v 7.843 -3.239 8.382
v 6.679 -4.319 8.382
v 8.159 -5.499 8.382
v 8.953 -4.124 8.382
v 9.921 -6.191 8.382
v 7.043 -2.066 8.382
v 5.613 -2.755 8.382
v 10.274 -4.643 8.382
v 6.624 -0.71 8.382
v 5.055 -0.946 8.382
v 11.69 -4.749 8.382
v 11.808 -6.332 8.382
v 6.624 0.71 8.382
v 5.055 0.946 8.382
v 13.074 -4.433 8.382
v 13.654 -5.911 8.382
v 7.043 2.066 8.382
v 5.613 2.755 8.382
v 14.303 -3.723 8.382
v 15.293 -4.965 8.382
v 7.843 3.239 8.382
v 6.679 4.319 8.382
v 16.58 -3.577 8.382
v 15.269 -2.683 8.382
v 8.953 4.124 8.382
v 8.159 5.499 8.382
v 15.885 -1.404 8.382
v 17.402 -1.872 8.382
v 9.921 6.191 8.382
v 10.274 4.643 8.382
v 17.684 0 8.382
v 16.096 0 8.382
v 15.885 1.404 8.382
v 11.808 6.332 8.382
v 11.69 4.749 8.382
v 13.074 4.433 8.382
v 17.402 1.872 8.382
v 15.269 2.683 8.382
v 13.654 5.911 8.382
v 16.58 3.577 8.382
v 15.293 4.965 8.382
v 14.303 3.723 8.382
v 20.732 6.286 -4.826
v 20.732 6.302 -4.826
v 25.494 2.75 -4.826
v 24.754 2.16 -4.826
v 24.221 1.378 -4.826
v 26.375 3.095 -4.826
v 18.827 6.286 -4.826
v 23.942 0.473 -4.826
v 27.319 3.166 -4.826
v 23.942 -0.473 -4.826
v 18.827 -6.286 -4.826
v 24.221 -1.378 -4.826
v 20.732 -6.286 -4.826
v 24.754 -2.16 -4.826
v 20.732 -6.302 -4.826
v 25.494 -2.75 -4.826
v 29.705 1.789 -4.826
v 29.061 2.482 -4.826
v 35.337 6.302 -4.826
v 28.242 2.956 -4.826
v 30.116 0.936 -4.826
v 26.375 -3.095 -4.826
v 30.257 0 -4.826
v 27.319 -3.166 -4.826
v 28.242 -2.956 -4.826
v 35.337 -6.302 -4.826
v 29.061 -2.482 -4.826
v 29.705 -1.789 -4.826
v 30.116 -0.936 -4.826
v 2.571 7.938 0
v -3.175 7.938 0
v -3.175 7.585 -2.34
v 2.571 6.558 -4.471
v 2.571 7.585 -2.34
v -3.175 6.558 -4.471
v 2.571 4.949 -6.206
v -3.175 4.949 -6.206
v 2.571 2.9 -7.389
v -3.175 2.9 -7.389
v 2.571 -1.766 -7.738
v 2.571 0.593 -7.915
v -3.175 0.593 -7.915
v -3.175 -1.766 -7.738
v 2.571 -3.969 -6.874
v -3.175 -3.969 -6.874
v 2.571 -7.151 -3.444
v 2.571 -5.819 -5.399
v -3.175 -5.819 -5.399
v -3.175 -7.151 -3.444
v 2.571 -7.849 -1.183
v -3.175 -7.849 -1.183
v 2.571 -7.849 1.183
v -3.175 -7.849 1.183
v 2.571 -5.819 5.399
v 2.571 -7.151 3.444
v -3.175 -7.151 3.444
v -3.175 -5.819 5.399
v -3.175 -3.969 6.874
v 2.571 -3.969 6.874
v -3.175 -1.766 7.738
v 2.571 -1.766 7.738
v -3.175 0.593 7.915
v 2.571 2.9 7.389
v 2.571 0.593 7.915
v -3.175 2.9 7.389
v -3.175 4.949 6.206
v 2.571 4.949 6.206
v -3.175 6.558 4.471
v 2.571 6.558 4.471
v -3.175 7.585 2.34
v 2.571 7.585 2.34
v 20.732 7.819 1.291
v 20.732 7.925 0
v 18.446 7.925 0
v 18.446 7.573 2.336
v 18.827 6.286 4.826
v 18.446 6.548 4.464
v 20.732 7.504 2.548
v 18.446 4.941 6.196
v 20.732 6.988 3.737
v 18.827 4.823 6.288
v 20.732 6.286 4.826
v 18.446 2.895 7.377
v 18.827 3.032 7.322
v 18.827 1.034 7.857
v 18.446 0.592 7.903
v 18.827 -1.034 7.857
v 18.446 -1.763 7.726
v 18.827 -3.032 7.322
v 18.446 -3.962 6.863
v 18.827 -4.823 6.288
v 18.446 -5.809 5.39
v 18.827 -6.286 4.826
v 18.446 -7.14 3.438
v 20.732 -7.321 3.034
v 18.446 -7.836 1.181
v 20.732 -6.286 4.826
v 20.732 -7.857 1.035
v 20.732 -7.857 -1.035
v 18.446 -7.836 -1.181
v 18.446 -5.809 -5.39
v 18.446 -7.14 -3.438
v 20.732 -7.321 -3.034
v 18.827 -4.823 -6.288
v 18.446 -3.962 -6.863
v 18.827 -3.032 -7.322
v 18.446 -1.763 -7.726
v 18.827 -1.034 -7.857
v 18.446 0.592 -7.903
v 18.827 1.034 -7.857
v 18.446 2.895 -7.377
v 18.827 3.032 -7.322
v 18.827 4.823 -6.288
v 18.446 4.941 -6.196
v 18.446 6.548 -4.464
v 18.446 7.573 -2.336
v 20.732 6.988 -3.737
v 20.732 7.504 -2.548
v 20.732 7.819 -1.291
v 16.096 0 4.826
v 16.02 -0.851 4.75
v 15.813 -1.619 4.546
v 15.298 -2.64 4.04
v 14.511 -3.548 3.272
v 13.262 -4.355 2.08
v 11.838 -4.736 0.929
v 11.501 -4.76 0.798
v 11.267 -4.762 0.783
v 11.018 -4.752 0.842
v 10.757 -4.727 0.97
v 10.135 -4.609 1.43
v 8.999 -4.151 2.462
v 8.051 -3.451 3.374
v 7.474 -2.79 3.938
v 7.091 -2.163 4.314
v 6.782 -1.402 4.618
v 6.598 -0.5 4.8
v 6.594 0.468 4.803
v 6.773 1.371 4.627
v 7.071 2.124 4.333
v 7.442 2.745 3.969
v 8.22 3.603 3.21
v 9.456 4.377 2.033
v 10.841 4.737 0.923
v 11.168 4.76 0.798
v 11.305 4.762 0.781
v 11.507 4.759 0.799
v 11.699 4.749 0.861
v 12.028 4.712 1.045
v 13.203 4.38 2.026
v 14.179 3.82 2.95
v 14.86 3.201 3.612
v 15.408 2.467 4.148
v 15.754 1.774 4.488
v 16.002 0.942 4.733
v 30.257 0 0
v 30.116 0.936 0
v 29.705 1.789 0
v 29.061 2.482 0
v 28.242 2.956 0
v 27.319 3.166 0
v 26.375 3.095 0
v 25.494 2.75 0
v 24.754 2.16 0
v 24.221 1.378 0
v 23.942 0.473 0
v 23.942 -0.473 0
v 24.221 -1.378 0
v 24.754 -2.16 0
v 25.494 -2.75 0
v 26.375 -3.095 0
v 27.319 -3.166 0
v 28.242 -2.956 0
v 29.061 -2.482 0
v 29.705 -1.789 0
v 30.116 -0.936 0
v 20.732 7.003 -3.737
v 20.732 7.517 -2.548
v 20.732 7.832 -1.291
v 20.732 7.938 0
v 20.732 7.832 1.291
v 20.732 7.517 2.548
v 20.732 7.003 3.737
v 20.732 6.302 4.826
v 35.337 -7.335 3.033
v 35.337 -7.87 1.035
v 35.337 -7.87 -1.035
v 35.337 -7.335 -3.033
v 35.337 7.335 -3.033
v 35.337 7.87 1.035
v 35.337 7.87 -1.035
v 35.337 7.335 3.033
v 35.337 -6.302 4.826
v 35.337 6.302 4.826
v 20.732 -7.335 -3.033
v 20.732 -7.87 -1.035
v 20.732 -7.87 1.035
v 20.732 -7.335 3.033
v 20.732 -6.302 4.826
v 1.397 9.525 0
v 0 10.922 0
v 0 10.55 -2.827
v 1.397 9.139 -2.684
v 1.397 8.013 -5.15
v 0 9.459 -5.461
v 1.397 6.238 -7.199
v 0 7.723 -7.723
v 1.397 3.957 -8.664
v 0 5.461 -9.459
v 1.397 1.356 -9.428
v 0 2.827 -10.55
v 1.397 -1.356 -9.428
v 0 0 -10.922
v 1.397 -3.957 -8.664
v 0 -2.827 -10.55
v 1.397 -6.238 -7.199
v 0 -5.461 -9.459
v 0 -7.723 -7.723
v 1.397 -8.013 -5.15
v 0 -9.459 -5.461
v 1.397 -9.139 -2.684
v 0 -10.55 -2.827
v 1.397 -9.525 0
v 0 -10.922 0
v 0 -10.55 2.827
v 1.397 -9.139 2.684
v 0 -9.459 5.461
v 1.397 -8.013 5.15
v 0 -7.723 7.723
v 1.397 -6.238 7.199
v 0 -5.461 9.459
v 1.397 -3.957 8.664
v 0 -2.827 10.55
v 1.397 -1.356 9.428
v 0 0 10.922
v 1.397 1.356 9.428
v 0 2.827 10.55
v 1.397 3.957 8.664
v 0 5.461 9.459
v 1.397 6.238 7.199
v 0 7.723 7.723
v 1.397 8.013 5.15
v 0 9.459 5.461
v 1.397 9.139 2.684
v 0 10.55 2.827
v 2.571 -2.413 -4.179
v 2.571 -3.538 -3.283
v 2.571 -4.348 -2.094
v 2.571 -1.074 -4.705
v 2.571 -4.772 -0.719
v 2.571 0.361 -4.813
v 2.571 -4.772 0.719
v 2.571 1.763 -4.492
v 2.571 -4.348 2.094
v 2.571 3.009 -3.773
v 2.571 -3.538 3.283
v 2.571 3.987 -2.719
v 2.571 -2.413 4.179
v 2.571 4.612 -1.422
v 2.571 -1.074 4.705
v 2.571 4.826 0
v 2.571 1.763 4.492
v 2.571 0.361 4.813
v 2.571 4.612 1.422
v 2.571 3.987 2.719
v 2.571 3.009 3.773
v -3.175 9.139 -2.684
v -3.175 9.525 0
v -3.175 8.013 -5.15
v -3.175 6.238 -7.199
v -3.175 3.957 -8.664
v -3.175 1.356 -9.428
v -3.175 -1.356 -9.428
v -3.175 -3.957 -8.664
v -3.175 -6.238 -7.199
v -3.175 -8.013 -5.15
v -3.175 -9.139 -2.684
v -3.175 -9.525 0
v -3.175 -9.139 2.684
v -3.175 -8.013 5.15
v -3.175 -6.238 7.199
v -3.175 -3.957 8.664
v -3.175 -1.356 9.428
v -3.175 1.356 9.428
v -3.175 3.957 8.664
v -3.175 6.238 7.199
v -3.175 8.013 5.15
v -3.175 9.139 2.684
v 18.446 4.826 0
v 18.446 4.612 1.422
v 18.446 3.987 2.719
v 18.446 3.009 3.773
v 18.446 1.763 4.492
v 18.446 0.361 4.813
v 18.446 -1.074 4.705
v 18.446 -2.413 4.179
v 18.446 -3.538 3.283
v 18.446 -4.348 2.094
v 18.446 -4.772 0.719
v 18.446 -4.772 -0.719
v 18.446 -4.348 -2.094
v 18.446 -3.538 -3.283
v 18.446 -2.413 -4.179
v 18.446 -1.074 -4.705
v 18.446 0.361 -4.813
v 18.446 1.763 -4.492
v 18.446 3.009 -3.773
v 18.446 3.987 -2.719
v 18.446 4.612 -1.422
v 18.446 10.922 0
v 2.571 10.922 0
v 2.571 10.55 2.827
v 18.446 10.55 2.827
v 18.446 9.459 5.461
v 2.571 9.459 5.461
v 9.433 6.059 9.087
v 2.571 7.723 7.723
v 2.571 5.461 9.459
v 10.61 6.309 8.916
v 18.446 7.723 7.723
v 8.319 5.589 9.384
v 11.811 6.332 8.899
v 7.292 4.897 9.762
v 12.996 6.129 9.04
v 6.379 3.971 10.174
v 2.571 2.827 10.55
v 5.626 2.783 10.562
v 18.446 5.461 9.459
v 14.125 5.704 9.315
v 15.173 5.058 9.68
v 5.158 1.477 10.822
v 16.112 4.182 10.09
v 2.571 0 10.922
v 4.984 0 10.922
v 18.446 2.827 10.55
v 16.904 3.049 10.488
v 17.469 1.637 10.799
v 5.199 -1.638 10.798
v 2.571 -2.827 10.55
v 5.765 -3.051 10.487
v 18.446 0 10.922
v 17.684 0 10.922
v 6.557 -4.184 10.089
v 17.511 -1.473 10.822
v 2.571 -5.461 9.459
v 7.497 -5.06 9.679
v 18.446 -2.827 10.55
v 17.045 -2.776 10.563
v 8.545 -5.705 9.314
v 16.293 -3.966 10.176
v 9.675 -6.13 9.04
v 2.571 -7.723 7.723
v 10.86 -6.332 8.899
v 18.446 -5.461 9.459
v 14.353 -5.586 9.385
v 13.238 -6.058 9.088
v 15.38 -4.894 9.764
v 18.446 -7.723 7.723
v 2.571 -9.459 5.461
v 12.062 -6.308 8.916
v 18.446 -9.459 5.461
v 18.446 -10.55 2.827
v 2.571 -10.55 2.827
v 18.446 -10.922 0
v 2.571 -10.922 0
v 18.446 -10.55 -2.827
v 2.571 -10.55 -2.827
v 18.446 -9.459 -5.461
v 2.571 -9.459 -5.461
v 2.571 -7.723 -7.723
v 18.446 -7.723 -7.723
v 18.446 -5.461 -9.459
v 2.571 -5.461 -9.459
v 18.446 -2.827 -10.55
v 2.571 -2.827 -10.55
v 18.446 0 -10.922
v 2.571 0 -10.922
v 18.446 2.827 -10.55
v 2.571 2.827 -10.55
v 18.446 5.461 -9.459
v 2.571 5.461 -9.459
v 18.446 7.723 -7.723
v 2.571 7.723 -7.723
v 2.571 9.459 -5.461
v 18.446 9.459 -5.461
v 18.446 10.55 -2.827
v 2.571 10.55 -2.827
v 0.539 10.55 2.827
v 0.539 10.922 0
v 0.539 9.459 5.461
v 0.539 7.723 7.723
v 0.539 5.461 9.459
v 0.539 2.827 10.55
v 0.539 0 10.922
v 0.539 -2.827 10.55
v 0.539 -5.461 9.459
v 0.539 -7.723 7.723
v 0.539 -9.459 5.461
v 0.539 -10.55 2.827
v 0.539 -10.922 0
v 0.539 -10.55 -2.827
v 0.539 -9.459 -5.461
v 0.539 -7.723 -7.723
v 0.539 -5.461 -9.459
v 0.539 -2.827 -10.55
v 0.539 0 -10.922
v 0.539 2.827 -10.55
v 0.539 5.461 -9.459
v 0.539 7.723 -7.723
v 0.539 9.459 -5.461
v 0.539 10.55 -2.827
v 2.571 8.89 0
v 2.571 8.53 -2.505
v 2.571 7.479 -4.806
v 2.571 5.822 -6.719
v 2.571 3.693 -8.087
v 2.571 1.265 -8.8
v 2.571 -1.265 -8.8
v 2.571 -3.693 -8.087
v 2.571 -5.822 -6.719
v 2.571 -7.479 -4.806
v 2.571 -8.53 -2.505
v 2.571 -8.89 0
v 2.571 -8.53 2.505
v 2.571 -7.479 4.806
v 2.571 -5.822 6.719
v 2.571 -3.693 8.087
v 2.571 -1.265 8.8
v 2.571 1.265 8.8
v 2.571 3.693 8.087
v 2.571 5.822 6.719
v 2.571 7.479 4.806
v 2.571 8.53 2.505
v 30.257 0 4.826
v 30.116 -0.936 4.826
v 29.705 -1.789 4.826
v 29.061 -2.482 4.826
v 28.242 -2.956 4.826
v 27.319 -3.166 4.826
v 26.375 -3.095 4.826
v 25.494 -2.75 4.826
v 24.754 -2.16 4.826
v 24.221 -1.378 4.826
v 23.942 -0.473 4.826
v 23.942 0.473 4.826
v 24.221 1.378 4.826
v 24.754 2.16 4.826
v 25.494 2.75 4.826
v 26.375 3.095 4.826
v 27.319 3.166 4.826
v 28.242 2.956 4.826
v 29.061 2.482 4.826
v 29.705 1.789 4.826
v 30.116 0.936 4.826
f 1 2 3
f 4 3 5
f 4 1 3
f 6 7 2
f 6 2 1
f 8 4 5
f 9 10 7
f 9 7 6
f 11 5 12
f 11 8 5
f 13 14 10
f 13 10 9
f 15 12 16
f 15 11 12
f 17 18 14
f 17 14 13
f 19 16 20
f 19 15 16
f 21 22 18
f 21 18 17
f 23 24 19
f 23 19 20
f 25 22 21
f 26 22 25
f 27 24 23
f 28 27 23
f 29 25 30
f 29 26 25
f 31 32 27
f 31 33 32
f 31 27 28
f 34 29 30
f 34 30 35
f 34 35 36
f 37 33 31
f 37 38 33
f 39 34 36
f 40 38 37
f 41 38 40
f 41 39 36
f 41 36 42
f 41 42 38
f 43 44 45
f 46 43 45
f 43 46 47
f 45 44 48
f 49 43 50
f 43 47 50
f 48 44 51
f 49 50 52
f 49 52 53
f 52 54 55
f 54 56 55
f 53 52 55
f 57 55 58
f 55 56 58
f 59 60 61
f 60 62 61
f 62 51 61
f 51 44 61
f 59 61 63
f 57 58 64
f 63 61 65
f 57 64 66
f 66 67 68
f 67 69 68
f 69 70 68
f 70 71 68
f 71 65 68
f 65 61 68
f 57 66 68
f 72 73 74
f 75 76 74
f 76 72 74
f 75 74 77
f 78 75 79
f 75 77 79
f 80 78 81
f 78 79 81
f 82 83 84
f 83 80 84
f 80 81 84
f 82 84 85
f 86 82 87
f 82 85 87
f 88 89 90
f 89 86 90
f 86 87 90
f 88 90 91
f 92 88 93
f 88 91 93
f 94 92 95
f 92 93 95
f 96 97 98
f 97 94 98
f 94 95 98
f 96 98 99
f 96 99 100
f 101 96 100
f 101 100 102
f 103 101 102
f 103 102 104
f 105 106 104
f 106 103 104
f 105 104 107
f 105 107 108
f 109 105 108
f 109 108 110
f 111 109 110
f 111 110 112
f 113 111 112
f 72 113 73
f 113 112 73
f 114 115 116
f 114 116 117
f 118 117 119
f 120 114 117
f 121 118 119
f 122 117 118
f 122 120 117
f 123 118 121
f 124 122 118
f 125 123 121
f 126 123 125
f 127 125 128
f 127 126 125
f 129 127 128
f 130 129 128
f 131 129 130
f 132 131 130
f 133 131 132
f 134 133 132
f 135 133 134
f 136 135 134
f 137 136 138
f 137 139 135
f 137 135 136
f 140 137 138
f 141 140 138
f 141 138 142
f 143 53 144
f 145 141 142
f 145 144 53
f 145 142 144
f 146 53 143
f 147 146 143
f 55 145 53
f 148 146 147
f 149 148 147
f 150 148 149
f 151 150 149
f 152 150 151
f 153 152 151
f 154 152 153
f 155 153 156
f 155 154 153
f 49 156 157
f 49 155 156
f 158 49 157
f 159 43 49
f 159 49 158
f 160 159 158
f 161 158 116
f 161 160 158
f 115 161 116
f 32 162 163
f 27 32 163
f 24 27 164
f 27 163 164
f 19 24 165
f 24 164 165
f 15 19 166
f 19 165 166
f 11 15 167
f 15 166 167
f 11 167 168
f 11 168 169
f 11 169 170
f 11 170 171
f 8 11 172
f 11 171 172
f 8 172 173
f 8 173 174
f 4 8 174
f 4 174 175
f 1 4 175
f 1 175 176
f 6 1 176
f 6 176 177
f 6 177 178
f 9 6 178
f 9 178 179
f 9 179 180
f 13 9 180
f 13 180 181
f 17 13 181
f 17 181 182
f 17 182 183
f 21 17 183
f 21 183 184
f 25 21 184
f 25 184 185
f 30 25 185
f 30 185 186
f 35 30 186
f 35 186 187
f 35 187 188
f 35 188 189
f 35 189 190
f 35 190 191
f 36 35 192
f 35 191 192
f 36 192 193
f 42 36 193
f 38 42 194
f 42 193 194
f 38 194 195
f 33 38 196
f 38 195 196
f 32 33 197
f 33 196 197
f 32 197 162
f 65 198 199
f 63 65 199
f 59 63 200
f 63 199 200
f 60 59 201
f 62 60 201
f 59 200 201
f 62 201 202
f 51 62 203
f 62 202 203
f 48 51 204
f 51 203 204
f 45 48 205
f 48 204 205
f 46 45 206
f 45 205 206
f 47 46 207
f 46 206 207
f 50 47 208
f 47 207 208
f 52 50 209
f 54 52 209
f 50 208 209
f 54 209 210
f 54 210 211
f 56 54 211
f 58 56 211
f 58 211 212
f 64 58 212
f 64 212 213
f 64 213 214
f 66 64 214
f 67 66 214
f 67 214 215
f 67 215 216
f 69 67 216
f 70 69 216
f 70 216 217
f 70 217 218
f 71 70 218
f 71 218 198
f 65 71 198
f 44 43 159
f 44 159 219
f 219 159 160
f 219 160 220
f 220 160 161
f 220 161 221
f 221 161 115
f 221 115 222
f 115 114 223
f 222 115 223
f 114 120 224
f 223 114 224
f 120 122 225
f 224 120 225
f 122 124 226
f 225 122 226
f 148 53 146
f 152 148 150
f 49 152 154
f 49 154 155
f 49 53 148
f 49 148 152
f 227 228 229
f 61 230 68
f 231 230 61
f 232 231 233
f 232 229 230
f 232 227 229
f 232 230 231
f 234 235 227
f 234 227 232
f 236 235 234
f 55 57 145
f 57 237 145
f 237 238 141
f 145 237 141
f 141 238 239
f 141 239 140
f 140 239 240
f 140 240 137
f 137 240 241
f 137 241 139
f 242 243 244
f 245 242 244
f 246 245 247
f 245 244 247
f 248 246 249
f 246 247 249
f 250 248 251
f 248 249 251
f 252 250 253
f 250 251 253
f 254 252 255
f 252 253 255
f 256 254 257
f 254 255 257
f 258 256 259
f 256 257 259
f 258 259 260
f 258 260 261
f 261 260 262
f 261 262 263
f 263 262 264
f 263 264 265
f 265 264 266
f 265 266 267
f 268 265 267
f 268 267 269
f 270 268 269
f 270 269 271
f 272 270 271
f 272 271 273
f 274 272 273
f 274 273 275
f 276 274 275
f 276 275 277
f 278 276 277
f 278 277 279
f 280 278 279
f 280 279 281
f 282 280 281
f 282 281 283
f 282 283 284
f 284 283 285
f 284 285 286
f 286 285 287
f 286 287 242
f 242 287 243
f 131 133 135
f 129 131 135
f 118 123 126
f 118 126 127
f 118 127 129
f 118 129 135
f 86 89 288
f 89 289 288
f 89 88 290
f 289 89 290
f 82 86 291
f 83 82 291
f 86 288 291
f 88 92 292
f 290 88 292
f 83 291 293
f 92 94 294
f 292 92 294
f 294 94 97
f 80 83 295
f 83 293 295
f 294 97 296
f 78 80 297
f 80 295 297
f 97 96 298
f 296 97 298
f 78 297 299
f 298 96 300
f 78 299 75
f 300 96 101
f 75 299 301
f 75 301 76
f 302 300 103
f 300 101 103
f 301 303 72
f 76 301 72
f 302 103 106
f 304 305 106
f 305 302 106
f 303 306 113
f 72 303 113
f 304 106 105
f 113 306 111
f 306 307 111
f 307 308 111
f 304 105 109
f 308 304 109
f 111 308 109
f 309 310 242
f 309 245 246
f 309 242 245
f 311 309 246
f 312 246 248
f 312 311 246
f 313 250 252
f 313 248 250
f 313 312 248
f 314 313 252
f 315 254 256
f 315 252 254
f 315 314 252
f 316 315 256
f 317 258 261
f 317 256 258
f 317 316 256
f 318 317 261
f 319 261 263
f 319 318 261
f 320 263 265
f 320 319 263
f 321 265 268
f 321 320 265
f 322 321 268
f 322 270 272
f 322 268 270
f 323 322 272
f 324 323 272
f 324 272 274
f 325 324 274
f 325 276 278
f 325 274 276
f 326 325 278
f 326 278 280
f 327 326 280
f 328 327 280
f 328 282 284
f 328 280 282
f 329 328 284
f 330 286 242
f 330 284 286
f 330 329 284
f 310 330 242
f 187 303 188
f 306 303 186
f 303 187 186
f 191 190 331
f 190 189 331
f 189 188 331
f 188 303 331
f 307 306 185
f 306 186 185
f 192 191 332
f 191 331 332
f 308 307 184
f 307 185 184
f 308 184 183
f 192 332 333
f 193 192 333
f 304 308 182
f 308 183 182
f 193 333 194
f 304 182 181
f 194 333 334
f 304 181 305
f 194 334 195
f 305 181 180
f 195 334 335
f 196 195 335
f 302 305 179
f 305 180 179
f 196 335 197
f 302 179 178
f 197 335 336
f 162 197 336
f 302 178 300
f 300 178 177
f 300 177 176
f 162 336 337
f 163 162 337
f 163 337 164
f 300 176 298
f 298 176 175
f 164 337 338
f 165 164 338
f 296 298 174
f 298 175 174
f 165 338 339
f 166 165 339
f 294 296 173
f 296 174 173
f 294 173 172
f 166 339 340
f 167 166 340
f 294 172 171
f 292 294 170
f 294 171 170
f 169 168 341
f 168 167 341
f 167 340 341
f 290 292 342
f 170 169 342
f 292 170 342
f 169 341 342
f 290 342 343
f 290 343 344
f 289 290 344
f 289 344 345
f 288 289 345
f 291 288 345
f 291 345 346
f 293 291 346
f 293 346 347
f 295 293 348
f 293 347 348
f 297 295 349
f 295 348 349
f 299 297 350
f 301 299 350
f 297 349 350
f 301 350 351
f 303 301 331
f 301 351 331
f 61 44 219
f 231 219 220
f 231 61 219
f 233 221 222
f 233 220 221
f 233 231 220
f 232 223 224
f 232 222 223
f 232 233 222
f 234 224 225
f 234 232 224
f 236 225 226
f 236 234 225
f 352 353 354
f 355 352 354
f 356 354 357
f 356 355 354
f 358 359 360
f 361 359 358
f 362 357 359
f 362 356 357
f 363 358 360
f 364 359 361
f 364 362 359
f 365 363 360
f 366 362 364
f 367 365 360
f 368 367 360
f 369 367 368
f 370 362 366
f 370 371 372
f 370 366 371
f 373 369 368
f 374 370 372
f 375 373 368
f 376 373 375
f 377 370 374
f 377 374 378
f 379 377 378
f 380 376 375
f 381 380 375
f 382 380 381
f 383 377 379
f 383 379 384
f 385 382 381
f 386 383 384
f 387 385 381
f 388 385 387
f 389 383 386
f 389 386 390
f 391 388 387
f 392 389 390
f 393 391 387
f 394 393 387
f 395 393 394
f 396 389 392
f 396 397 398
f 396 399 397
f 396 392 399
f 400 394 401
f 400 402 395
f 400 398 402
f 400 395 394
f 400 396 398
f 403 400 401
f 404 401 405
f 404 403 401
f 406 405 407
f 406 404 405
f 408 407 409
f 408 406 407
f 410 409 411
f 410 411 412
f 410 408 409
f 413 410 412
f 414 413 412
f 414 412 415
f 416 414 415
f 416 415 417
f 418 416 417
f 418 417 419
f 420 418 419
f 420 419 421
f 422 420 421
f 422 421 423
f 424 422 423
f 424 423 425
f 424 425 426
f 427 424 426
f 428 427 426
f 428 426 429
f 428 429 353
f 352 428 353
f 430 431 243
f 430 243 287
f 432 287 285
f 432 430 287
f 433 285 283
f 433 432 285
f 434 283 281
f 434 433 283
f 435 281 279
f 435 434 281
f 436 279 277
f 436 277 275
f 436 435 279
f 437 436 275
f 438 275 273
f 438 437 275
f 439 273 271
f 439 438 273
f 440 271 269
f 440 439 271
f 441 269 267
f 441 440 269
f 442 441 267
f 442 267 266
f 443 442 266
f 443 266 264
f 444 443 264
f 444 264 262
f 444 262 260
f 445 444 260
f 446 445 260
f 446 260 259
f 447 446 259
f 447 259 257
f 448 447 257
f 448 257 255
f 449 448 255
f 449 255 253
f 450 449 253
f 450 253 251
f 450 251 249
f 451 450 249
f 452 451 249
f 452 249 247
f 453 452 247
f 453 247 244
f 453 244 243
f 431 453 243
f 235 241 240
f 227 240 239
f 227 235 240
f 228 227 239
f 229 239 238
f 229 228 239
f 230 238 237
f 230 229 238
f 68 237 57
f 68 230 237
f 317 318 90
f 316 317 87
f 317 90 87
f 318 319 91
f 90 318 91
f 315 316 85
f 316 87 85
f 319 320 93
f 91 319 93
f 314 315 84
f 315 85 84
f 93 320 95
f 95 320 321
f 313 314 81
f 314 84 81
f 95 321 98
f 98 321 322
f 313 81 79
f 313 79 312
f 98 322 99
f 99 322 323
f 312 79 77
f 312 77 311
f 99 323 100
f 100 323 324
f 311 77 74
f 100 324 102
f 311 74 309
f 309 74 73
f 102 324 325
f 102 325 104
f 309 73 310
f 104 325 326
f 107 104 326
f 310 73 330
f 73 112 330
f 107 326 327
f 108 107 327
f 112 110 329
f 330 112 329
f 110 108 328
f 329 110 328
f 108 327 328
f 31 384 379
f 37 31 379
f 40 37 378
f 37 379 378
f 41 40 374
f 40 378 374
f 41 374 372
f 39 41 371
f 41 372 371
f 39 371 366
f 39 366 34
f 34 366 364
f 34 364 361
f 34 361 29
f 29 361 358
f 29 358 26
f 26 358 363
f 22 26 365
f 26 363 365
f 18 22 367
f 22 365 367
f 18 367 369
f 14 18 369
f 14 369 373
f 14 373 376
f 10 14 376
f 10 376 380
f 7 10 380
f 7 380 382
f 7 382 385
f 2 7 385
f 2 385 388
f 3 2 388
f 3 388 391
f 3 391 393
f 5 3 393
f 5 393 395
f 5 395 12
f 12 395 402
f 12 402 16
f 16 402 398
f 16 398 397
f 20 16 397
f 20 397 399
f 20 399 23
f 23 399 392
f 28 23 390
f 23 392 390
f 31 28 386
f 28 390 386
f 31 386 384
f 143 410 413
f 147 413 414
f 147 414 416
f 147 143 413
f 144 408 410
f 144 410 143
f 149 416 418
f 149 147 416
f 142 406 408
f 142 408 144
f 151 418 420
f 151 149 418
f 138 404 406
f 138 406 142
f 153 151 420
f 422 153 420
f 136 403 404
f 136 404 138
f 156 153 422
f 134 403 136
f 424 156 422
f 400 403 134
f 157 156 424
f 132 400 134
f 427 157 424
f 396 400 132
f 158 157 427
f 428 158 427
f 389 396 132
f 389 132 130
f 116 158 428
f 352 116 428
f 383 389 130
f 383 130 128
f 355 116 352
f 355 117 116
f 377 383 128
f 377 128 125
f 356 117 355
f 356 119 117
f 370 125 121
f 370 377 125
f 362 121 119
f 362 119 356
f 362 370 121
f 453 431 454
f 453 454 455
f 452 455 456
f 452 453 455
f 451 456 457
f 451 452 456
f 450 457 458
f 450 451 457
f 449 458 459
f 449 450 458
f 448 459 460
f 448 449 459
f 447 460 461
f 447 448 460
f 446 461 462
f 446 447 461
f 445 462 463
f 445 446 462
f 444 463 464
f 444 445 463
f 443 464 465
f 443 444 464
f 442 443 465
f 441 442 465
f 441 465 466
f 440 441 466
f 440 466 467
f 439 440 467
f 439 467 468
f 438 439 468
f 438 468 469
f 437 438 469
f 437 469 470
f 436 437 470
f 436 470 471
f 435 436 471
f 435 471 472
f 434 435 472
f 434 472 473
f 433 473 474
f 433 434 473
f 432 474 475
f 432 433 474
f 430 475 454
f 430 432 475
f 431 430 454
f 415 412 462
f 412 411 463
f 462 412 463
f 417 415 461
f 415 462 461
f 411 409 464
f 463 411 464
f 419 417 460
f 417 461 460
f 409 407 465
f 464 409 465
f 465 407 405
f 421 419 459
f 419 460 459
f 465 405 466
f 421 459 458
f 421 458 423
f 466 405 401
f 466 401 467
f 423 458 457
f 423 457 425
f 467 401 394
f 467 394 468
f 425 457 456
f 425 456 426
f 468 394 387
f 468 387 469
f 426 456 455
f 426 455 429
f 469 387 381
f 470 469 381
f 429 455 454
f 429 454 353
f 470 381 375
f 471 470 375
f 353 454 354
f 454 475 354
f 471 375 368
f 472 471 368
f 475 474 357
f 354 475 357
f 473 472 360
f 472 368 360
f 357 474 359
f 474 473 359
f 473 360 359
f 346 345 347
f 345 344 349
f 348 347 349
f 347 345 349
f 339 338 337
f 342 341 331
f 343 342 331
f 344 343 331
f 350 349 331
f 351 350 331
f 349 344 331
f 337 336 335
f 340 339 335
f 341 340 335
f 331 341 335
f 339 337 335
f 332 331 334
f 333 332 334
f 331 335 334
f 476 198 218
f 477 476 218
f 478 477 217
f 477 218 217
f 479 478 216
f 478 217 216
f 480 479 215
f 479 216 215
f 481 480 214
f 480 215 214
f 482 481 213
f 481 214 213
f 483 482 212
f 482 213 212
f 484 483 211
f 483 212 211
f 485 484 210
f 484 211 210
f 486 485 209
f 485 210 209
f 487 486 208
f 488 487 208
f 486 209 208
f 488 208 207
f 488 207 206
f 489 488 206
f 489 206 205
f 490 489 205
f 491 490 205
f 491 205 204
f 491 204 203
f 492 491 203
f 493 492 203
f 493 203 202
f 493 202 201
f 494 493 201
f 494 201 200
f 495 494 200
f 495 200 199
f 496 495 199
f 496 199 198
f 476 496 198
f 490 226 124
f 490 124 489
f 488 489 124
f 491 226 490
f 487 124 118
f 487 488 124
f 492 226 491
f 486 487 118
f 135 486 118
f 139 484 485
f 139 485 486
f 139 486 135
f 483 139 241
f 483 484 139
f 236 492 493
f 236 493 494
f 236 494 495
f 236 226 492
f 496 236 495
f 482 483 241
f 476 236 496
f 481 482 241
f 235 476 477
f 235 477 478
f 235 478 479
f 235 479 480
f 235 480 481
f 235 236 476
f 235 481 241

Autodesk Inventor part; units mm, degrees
ref_plane "YZ Plane" through (0, 0, 0) normal (1, 0, 0) x (0, 1, 0)
ref_plane "XZ Plane" through (0, 0, 0) normal (0, 1, 0) x (-1, 0, 0)
sketch "Sketch1" plane through (0, 0, 0) normal (0, 0, 1) x (1, 0, 0)
  line L0 (0, 0) -> (35.3368, 0)
  line L1 (0, 10.922) -> (1.397, 9.525)
  line L2 (0, 10.922) -> (0.5388, 10.922)
  line L3 (0.5388, 10.922) -> (2.5708, 8.89)
  line L4 (2.5708, 8.89) -> (2.5708, 10.922)
  line L5 (2.5708, 10.922) -> (18.4458, 10.922)
  line L6 (18.4458, 10.922) -> (18.4458, 7.9248)
  line L7 (18.4458, 7.9248) -> (20.7318, 7.9248)
  line L8 (20.7318, 7.9248) -> (20.7318, 7.9375)
  line L9 (20.7318, 7.9375) -> (35.3368, 7.9375)
  line L10 (35.3368, 7.9375) -> (35.3368, 0)
  circle A0 centre (11.3338, 0) radius 4.7625
  circle A1 centre (27.0818, 0) radius 3.175
  line L11 (0, 10.922) -> (0, 0) construction
  line L12 (0.5388, 10.922) -> (2.5708, 10.922) construction
  line L13 (2.5708, 8.89) -> (2.5708, 7.9375) construction
  line L14 (1.397, 9.525) -> (0, 9.525)
  line L15 (0, 9.525) -> (0, 7.9375) construction
  line L16 (2.5708, 7.9375) -> (0, 7.9375)
  line L17 (0, 9.525) -> (0, 7.9375)
  line L18 (2.5708, 7.9375) -> (2.5708, 4.826)
  line L19 (2.5708, 4.826) -> (18.4458, 4.826)
  line L20 (18.4458, 4.826) -> (18.4458, 0)
  line L21 (18.4458, 7.9248) -> (18.4458, 4.826)
  line L22 (35.3368, 4.826) -> (18.4458, 4.826)
  line L23 (0, 9.525) -> (-3.175, 9.525)
  line L24 (-3.175, 9.525) -> (-3.175, 7.9375)
  line L25 (-3.175, 7.9375) -> (0, 7.9375)
  dimension "d1" = 21.844
  dimension "d2" = 9.525
  dimension "d4" = 2.286
  dimension "d5" = 6.35
  dimension "d6" = 8.636
  dimension "d8" = 15.8496
  dimension "d9" = 15.875
  dimension "d10" = 0.381
  dimension "d11" = 45
  dimension "d12" = 15.748
  dimension "d13" = 17.78
  dimension "d14" = 19.05
  dimension "d15" = 15.875
  dimension "d17" = 9.652
  dimension "d18" = 15.875
  dimension "d19" = 9.652
  dimension "d37" = 3.175
  dimension "d38" = 8.255
revolve "Revolution1" add sketch "Sketch1" angle 360 about axis through (0, 0, 0) along (1, 0, 0) picked at (27.874, 1.2084) contours L20 L22 L10 L0 A1 | A1 L0 | L19 L18 L16 L17 L14 L1 L2 L3 L4 L5 L6 L21 | L21 L7 L8 L9 L10 L22 | L25 L24 L23 L17
extrude "Extrusion2" cut sketch "Sketch1" along normal blind 25.4 contours A0 L0 | L0 A0
ref_plane "Work Plane1" through (10.5083, 0, 10.922) normal (0, 0, 1) x (1, 0, 0)
sketch "Sketch2" plane through (10.5083, 0, 10.922) normal (0, 0, 1) x (1, 0, 0)
  line L0 (0.8255, -4.7625) -> (0.8255, 0) construction
  circle A0 centre (0.8255, 0) radius 6.35
  point P0 (-10.5083, 0)
  dimension "d28" = 12.7
  dimension "d29" = 4.7625
extrude "Extrusion3" cut sketch "Sketch2" against normal blind 2.54
sketch "Sketch3" plane through (35.3368, 0, 0) normal (1, 0, 0) x (0, 0, -1)
  circle A0 centre (0, 0) radius 7.9375 projected
  line L0 (-4.826, 6.3019) -> (-4.826, -6.3019)
  line L1 (4.826, 6.3019) -> (4.826, -6.3019)
  dimension "d32" = 9.652
extrude "Extrusion4" cut sketch "Sketch3" against normal blind 16.51 contours A0 L1 | L0 A0
extrude "Extrusion5" cut sketch "Sketch1" along normal through all both and the other way through all contours A1 L0 | L0 A1
thread "Thread1" size "5/8-11 UNC" class "2A" standard "ANSI Unified Screw Threads" full length
thread "Thread2" size "5/8-11 UNC" class "2A" standard "ANSI Unified Screw Threads" full length
equation "\"d17\" = d19"
properties part number "Rebuild Shooter NCDME075-0600 Cylinder Back Section" material "Aluminum 6061"
